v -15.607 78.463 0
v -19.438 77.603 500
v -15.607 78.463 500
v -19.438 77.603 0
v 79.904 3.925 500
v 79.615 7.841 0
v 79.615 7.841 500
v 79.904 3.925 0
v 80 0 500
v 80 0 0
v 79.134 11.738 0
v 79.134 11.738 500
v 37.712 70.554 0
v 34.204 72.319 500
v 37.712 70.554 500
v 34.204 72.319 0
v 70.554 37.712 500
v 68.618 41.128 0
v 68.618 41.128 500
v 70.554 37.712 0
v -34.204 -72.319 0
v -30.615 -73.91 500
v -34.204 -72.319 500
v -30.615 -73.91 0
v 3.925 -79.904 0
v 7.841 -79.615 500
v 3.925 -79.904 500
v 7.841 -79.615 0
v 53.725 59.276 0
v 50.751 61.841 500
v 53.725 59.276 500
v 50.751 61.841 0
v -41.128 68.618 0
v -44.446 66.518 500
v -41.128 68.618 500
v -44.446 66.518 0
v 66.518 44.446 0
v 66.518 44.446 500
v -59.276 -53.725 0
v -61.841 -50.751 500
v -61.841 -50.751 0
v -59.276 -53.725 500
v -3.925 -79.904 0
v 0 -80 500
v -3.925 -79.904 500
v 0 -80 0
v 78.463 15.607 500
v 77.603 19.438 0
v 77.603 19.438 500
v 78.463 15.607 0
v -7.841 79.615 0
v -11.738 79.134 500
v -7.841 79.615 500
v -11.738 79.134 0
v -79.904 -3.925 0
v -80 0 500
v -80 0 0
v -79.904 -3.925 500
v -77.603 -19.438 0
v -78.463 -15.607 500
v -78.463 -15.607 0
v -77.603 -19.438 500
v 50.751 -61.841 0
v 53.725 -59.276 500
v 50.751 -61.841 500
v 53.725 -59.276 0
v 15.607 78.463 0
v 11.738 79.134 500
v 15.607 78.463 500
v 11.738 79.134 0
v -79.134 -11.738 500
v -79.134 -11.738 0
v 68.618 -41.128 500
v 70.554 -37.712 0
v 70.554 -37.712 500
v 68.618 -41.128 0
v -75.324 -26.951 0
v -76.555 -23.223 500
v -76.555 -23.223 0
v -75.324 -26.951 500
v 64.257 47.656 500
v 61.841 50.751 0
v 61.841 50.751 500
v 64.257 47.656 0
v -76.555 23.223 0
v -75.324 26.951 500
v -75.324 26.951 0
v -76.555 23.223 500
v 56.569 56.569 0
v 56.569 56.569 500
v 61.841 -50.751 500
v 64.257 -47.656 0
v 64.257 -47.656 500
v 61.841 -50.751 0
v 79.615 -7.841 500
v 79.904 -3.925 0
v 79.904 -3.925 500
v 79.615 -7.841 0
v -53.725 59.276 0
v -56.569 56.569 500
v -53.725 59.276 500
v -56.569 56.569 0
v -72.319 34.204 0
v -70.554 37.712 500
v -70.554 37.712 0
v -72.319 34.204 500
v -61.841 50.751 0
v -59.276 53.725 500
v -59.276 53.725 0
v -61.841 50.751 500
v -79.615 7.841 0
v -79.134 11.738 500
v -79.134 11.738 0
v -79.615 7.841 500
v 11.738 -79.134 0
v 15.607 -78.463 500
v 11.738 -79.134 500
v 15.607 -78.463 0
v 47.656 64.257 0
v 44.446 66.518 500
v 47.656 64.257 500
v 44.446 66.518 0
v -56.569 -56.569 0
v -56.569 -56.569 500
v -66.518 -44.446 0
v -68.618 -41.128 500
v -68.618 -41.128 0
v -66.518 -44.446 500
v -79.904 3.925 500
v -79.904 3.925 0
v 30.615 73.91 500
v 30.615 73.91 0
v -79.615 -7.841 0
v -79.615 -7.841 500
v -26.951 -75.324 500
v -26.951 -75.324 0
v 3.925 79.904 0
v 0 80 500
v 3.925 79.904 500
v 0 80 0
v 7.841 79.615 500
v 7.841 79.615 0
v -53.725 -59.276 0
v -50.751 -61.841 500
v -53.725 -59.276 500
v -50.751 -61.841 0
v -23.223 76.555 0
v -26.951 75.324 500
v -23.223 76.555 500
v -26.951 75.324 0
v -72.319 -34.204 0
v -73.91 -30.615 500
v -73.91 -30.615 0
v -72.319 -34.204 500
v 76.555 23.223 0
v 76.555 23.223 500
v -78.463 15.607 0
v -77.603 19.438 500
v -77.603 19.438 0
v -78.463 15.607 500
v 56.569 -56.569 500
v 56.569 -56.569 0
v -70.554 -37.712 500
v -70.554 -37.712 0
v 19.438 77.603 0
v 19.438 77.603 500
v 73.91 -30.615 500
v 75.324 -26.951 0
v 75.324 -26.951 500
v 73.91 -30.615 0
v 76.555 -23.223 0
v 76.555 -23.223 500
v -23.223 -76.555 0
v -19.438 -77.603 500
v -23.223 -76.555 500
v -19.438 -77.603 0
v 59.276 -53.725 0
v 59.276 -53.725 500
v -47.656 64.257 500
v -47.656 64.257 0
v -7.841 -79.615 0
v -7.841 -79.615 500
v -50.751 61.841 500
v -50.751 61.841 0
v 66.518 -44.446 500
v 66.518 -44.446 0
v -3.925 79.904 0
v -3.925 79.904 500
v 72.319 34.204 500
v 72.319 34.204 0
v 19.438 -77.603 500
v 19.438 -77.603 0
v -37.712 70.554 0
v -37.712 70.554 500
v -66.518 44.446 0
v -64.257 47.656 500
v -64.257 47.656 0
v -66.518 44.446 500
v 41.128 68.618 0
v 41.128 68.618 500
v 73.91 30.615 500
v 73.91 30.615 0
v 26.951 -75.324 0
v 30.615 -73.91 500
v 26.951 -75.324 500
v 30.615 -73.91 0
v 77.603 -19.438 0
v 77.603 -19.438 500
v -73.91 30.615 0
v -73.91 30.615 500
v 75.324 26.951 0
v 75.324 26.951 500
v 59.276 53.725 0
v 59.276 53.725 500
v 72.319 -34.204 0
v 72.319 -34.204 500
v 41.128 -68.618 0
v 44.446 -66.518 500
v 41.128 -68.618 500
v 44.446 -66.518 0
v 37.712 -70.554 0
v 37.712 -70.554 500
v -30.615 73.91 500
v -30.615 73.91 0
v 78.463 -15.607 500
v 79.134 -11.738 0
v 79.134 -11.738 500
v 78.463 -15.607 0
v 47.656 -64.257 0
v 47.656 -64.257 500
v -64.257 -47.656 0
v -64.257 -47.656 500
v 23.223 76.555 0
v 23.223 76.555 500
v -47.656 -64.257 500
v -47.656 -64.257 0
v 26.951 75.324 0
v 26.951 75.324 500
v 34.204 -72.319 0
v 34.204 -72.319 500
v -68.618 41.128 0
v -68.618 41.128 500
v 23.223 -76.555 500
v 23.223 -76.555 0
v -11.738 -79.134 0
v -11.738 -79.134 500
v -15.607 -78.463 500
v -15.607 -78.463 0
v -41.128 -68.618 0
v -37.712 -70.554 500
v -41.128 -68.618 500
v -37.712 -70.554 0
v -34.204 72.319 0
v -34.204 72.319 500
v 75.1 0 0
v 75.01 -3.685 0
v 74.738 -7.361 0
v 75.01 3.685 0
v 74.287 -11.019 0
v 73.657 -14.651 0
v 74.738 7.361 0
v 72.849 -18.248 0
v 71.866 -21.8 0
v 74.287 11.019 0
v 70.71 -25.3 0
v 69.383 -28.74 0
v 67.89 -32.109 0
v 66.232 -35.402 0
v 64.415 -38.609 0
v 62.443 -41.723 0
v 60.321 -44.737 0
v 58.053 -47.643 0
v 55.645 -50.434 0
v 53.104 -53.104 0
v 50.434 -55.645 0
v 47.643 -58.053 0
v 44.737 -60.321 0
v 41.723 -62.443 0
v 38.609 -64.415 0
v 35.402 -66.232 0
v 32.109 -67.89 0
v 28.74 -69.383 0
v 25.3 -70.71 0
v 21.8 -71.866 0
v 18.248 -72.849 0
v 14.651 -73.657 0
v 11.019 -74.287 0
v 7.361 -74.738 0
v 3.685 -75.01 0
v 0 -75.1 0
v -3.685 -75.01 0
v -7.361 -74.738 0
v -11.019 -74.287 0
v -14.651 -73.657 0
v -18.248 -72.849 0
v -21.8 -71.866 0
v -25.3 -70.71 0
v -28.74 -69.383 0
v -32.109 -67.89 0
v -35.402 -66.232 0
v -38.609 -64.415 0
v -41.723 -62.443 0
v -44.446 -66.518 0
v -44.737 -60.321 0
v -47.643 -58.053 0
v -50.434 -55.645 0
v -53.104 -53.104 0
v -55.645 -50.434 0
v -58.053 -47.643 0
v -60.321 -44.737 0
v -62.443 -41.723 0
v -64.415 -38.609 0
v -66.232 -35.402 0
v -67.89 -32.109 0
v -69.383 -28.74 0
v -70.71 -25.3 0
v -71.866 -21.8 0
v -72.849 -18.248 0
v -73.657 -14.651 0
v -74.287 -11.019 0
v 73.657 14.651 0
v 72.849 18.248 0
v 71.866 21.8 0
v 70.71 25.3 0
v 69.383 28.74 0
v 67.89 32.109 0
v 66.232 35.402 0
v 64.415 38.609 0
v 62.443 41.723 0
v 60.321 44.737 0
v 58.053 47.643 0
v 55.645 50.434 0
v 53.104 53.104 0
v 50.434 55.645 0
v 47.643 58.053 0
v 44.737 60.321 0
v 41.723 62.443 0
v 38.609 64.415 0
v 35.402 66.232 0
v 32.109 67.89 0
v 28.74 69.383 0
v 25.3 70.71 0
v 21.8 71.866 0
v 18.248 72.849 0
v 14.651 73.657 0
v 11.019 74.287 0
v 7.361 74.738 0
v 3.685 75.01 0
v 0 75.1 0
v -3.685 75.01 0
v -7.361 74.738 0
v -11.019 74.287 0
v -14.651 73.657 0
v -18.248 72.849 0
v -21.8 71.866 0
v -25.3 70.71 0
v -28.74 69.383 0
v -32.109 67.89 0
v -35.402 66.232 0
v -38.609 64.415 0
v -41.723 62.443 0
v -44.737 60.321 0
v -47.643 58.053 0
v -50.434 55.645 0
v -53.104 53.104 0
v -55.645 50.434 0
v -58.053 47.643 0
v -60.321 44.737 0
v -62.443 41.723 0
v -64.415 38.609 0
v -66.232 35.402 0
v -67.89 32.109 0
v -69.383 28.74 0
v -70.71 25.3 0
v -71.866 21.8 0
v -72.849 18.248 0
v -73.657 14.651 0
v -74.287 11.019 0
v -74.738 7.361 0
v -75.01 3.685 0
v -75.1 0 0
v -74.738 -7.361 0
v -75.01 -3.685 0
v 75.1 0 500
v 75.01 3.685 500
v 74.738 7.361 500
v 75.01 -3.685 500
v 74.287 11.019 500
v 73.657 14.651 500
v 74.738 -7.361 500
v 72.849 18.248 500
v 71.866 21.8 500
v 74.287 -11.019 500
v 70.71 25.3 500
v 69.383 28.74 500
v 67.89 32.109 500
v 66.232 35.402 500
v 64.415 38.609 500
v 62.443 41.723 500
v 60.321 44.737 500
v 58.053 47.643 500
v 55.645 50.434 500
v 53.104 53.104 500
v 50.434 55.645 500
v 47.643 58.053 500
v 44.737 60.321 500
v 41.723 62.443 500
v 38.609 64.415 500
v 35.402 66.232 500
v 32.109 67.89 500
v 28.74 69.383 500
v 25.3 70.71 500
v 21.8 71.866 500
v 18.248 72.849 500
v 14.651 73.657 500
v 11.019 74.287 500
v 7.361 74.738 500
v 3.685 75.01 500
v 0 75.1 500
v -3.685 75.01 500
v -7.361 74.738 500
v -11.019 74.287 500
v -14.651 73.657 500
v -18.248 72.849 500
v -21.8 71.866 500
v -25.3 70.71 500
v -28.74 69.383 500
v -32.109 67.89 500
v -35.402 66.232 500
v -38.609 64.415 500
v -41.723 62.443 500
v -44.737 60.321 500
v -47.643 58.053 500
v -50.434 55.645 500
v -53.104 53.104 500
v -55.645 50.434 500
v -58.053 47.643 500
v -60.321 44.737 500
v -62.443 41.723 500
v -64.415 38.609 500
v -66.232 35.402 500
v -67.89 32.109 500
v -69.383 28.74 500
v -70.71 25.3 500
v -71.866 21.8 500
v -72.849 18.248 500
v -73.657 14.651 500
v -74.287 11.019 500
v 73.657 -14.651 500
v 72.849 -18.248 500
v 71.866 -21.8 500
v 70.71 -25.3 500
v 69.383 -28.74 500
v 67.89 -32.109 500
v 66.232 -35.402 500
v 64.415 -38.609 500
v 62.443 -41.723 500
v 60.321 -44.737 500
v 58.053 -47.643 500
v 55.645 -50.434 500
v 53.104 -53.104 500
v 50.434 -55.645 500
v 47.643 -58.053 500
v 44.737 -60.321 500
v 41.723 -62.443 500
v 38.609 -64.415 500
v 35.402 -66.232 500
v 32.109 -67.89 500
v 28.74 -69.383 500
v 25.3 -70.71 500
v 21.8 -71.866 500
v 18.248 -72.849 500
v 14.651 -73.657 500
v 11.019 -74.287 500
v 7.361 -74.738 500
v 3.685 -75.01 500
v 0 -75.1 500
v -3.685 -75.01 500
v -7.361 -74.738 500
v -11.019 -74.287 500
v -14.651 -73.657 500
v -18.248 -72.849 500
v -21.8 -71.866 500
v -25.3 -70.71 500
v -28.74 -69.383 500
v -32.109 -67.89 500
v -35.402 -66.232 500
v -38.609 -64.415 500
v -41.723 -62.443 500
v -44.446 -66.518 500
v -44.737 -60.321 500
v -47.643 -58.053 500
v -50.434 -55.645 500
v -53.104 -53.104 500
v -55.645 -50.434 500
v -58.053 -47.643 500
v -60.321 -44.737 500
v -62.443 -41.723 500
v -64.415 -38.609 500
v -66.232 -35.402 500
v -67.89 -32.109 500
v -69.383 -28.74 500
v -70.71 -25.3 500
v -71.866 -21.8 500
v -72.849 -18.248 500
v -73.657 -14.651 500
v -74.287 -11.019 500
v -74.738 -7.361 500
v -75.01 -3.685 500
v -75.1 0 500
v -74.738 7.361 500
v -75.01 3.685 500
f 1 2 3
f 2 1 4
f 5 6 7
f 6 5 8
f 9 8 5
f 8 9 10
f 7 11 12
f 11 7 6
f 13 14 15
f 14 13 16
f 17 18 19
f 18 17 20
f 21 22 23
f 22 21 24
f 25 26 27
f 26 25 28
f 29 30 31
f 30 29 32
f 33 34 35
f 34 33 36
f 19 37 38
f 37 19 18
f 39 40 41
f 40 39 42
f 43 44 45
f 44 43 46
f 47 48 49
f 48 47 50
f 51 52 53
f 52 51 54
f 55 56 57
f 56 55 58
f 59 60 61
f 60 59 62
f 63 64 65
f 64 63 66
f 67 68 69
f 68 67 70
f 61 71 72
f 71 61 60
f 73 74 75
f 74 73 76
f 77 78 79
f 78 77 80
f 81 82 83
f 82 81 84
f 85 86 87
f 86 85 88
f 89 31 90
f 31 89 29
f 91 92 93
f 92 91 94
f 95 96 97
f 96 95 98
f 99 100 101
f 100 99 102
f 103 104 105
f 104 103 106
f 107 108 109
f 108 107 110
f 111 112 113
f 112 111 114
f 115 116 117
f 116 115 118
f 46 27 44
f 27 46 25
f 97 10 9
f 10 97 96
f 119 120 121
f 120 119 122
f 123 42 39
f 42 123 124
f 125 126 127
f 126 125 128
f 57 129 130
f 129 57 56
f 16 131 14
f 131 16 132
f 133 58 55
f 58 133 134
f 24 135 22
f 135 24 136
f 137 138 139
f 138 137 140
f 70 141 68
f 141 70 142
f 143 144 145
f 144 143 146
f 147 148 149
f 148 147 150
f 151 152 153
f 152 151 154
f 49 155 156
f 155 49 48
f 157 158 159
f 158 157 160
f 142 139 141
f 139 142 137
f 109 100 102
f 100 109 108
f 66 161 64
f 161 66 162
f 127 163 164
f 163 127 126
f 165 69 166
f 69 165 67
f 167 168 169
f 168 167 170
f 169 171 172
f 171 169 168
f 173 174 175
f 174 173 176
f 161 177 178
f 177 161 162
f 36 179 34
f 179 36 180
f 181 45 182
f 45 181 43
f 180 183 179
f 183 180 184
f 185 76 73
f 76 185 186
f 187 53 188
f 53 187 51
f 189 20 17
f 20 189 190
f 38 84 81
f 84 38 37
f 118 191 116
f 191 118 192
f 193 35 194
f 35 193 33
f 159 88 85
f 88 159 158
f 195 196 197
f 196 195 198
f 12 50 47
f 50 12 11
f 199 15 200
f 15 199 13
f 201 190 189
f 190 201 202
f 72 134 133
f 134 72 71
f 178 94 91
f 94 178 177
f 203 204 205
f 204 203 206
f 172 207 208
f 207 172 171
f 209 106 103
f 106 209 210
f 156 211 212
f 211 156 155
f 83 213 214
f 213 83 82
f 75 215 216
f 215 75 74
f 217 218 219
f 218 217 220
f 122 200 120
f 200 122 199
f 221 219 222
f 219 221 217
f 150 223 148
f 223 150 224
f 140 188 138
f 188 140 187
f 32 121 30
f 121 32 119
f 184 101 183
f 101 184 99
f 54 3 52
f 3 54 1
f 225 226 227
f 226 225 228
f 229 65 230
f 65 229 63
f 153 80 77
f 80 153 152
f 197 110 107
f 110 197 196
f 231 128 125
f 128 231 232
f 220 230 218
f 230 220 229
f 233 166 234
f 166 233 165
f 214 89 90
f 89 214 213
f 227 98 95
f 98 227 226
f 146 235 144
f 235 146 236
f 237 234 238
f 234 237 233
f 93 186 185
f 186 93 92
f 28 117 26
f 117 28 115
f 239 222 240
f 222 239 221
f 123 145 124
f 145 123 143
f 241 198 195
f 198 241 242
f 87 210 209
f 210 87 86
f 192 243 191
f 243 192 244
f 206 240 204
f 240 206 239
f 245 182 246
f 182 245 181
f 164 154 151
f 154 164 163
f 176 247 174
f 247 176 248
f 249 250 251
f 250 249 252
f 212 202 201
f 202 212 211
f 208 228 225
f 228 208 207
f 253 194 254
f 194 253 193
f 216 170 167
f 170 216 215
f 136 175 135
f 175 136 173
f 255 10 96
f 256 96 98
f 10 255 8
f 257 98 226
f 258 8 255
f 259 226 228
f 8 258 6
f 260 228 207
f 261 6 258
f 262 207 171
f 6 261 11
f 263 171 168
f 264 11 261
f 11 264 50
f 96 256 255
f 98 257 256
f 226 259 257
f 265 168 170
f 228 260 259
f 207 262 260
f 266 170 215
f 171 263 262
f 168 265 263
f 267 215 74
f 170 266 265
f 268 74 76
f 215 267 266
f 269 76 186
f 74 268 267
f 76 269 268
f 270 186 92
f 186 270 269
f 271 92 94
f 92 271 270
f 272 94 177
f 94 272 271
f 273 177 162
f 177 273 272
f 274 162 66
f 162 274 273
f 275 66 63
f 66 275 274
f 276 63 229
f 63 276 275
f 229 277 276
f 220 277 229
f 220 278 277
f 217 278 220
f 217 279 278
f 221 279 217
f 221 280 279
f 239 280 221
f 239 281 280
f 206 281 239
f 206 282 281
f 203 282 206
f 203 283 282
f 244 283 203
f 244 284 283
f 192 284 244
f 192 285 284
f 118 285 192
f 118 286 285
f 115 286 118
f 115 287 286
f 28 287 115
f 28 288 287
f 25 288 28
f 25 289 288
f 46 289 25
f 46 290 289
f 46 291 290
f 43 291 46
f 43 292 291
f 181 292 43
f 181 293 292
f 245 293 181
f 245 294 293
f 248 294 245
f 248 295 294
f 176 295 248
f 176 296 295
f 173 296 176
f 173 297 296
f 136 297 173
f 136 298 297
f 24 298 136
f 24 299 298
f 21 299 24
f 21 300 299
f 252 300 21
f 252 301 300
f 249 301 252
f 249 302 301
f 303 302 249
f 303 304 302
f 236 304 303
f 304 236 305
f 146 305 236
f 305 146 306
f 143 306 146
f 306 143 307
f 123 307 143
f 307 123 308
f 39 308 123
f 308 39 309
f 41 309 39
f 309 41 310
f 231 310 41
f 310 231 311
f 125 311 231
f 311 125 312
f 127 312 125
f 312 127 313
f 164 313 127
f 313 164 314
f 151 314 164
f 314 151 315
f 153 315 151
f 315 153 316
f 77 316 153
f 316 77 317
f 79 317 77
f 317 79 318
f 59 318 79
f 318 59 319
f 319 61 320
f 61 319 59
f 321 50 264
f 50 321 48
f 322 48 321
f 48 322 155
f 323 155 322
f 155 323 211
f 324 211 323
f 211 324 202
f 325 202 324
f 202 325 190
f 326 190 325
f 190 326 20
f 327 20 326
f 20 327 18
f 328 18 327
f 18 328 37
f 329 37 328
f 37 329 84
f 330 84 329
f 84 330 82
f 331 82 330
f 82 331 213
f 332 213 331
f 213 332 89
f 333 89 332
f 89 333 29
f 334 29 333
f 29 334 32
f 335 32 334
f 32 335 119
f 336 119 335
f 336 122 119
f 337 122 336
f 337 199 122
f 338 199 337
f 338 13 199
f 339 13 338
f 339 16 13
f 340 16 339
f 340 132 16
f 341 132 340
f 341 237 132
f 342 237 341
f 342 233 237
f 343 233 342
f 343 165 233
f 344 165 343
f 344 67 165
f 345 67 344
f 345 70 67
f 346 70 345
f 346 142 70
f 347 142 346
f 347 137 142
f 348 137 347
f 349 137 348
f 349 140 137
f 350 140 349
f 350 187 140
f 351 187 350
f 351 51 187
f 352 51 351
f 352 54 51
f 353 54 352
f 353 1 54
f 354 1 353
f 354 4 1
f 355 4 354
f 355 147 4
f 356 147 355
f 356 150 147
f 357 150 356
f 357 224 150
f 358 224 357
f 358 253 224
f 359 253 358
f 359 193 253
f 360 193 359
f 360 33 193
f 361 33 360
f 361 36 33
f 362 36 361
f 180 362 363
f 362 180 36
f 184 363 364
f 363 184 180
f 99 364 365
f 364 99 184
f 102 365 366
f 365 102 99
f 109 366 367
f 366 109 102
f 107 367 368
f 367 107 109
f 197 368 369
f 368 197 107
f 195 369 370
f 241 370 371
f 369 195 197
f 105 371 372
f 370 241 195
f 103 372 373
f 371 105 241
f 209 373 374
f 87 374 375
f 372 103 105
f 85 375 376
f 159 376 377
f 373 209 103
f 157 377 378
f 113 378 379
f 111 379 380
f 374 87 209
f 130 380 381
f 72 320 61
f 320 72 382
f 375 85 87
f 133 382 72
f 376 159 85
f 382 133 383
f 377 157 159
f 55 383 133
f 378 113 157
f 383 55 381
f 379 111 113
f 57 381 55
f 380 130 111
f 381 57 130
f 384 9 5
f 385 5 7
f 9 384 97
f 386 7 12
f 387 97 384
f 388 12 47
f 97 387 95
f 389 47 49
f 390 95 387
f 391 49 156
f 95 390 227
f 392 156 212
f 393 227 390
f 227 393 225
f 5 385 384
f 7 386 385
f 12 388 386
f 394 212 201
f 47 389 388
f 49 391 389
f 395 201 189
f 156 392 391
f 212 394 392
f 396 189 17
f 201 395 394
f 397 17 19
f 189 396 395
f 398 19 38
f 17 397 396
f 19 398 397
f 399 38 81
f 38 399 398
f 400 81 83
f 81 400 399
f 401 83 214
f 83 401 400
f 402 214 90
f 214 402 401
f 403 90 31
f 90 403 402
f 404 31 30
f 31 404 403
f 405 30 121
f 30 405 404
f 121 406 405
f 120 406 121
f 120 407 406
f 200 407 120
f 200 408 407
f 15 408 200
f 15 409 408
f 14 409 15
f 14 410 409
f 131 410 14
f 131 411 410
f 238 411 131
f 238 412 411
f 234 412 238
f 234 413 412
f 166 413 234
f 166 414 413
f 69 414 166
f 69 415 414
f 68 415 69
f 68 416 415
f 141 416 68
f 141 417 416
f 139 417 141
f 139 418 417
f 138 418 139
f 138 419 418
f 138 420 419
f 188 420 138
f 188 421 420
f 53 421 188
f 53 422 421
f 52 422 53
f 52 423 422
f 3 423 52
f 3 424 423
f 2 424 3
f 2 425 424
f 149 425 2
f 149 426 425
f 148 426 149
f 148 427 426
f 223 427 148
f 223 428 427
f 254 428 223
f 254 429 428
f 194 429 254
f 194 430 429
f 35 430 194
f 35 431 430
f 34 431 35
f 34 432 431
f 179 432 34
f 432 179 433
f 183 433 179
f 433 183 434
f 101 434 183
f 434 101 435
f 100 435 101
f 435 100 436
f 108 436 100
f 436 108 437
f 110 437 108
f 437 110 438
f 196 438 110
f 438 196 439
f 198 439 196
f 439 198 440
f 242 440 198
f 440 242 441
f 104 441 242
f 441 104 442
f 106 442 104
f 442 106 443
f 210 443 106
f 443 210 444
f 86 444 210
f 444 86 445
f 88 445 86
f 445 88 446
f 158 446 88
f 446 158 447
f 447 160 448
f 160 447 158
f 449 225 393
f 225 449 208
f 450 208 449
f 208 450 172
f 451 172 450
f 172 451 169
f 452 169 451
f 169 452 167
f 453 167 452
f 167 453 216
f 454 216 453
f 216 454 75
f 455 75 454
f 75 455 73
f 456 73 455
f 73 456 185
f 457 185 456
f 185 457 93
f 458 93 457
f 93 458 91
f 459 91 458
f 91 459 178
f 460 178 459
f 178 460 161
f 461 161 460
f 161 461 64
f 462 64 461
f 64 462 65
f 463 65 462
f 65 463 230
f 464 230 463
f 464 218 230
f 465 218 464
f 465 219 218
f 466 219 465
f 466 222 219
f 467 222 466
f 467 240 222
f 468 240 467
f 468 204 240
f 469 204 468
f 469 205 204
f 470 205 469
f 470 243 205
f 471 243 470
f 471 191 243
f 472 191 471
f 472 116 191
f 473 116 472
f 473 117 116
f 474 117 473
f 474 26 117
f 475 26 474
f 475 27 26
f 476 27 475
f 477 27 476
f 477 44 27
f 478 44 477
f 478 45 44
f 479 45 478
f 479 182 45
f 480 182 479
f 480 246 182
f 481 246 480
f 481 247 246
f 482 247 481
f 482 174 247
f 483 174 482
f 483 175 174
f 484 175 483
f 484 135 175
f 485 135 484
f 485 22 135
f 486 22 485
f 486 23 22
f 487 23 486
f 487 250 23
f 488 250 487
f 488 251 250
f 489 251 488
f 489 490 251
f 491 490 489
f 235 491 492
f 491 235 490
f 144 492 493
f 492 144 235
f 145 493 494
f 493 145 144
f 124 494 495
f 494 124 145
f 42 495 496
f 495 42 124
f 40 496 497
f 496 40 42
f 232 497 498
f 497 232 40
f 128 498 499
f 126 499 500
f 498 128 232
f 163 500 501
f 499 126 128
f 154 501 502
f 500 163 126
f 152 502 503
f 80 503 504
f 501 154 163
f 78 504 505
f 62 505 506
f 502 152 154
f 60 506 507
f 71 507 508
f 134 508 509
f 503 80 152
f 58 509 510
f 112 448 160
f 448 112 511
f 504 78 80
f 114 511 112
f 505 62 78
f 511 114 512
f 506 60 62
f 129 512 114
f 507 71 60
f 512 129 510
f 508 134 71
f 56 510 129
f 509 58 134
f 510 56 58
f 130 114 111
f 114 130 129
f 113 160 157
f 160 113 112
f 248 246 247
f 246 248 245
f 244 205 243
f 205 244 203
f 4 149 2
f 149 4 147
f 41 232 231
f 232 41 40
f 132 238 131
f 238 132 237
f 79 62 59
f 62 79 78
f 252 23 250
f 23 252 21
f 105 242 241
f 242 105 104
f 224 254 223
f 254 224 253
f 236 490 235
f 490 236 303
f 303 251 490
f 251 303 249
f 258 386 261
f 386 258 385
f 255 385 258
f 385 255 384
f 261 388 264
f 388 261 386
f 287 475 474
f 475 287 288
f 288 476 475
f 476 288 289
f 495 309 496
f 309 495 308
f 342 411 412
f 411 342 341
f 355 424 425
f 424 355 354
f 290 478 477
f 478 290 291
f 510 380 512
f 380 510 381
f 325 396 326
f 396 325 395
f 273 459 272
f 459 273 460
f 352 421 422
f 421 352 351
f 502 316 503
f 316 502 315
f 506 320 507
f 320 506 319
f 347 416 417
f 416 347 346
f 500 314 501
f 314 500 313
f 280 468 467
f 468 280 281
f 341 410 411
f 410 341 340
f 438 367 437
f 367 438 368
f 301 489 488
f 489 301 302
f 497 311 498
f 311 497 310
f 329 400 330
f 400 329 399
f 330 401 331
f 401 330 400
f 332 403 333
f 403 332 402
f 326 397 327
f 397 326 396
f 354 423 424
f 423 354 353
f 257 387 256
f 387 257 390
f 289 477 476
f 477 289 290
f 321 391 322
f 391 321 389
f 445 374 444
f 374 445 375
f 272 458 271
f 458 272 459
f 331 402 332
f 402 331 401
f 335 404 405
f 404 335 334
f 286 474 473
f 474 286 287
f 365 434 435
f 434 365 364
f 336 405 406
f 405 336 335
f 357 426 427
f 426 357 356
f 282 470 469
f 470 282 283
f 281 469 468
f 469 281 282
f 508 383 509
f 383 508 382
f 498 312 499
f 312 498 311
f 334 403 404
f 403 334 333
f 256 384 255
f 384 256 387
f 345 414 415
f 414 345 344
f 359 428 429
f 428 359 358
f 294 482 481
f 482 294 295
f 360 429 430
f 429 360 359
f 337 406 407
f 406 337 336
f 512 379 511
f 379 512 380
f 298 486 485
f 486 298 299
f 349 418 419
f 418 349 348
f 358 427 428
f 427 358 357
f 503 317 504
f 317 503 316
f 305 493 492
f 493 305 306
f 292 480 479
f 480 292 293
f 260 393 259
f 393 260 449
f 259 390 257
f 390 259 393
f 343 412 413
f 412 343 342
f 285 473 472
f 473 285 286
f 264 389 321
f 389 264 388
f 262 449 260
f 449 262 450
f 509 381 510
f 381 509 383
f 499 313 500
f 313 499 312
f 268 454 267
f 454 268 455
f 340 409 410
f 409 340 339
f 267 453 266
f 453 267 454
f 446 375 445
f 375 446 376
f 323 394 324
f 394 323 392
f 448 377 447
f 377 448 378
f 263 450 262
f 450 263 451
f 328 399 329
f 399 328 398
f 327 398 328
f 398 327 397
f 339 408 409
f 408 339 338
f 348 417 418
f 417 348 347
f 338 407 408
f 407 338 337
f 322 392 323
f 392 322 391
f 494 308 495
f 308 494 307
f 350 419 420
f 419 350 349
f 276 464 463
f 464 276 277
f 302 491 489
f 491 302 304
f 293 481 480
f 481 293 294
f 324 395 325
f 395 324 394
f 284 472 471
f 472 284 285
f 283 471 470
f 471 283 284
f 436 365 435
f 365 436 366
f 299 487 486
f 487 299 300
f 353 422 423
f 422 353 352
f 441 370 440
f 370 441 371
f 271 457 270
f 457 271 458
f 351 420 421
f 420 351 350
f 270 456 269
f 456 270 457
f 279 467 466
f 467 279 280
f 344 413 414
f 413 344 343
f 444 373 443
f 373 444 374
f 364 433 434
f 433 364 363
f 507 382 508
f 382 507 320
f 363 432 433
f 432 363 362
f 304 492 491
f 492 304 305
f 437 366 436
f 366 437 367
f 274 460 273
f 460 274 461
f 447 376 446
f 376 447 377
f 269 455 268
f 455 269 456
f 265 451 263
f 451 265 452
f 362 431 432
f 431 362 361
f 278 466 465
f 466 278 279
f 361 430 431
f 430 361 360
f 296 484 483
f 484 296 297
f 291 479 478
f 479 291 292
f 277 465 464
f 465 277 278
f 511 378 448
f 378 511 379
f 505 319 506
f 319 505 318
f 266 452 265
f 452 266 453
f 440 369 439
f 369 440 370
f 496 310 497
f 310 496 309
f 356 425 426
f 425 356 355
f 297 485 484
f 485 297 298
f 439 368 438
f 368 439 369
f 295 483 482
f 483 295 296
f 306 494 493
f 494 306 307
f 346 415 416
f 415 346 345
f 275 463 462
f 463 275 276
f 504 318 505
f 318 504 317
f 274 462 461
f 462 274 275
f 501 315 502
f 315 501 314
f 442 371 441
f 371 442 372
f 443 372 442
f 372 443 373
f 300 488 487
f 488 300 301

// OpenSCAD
$fn = 128;

// HT pipe parameters (approximate for HT 160)
outer_d = 160;      // mm
wall_th = 4.9;      // mm (typical for DN160 HT pipe; adjust if needed)
length = 500;       // mm

inner_d = outer_d - 2*wall_th;

module ht_pipe(od, id, h) {
    difference() {
        cylinder(h = h, d = od);
        translate([0,0,-0.5])
            cylinder(h = h + 1, d = id);
    }
}

ht_pipe(outer_d, inner_d, length);
